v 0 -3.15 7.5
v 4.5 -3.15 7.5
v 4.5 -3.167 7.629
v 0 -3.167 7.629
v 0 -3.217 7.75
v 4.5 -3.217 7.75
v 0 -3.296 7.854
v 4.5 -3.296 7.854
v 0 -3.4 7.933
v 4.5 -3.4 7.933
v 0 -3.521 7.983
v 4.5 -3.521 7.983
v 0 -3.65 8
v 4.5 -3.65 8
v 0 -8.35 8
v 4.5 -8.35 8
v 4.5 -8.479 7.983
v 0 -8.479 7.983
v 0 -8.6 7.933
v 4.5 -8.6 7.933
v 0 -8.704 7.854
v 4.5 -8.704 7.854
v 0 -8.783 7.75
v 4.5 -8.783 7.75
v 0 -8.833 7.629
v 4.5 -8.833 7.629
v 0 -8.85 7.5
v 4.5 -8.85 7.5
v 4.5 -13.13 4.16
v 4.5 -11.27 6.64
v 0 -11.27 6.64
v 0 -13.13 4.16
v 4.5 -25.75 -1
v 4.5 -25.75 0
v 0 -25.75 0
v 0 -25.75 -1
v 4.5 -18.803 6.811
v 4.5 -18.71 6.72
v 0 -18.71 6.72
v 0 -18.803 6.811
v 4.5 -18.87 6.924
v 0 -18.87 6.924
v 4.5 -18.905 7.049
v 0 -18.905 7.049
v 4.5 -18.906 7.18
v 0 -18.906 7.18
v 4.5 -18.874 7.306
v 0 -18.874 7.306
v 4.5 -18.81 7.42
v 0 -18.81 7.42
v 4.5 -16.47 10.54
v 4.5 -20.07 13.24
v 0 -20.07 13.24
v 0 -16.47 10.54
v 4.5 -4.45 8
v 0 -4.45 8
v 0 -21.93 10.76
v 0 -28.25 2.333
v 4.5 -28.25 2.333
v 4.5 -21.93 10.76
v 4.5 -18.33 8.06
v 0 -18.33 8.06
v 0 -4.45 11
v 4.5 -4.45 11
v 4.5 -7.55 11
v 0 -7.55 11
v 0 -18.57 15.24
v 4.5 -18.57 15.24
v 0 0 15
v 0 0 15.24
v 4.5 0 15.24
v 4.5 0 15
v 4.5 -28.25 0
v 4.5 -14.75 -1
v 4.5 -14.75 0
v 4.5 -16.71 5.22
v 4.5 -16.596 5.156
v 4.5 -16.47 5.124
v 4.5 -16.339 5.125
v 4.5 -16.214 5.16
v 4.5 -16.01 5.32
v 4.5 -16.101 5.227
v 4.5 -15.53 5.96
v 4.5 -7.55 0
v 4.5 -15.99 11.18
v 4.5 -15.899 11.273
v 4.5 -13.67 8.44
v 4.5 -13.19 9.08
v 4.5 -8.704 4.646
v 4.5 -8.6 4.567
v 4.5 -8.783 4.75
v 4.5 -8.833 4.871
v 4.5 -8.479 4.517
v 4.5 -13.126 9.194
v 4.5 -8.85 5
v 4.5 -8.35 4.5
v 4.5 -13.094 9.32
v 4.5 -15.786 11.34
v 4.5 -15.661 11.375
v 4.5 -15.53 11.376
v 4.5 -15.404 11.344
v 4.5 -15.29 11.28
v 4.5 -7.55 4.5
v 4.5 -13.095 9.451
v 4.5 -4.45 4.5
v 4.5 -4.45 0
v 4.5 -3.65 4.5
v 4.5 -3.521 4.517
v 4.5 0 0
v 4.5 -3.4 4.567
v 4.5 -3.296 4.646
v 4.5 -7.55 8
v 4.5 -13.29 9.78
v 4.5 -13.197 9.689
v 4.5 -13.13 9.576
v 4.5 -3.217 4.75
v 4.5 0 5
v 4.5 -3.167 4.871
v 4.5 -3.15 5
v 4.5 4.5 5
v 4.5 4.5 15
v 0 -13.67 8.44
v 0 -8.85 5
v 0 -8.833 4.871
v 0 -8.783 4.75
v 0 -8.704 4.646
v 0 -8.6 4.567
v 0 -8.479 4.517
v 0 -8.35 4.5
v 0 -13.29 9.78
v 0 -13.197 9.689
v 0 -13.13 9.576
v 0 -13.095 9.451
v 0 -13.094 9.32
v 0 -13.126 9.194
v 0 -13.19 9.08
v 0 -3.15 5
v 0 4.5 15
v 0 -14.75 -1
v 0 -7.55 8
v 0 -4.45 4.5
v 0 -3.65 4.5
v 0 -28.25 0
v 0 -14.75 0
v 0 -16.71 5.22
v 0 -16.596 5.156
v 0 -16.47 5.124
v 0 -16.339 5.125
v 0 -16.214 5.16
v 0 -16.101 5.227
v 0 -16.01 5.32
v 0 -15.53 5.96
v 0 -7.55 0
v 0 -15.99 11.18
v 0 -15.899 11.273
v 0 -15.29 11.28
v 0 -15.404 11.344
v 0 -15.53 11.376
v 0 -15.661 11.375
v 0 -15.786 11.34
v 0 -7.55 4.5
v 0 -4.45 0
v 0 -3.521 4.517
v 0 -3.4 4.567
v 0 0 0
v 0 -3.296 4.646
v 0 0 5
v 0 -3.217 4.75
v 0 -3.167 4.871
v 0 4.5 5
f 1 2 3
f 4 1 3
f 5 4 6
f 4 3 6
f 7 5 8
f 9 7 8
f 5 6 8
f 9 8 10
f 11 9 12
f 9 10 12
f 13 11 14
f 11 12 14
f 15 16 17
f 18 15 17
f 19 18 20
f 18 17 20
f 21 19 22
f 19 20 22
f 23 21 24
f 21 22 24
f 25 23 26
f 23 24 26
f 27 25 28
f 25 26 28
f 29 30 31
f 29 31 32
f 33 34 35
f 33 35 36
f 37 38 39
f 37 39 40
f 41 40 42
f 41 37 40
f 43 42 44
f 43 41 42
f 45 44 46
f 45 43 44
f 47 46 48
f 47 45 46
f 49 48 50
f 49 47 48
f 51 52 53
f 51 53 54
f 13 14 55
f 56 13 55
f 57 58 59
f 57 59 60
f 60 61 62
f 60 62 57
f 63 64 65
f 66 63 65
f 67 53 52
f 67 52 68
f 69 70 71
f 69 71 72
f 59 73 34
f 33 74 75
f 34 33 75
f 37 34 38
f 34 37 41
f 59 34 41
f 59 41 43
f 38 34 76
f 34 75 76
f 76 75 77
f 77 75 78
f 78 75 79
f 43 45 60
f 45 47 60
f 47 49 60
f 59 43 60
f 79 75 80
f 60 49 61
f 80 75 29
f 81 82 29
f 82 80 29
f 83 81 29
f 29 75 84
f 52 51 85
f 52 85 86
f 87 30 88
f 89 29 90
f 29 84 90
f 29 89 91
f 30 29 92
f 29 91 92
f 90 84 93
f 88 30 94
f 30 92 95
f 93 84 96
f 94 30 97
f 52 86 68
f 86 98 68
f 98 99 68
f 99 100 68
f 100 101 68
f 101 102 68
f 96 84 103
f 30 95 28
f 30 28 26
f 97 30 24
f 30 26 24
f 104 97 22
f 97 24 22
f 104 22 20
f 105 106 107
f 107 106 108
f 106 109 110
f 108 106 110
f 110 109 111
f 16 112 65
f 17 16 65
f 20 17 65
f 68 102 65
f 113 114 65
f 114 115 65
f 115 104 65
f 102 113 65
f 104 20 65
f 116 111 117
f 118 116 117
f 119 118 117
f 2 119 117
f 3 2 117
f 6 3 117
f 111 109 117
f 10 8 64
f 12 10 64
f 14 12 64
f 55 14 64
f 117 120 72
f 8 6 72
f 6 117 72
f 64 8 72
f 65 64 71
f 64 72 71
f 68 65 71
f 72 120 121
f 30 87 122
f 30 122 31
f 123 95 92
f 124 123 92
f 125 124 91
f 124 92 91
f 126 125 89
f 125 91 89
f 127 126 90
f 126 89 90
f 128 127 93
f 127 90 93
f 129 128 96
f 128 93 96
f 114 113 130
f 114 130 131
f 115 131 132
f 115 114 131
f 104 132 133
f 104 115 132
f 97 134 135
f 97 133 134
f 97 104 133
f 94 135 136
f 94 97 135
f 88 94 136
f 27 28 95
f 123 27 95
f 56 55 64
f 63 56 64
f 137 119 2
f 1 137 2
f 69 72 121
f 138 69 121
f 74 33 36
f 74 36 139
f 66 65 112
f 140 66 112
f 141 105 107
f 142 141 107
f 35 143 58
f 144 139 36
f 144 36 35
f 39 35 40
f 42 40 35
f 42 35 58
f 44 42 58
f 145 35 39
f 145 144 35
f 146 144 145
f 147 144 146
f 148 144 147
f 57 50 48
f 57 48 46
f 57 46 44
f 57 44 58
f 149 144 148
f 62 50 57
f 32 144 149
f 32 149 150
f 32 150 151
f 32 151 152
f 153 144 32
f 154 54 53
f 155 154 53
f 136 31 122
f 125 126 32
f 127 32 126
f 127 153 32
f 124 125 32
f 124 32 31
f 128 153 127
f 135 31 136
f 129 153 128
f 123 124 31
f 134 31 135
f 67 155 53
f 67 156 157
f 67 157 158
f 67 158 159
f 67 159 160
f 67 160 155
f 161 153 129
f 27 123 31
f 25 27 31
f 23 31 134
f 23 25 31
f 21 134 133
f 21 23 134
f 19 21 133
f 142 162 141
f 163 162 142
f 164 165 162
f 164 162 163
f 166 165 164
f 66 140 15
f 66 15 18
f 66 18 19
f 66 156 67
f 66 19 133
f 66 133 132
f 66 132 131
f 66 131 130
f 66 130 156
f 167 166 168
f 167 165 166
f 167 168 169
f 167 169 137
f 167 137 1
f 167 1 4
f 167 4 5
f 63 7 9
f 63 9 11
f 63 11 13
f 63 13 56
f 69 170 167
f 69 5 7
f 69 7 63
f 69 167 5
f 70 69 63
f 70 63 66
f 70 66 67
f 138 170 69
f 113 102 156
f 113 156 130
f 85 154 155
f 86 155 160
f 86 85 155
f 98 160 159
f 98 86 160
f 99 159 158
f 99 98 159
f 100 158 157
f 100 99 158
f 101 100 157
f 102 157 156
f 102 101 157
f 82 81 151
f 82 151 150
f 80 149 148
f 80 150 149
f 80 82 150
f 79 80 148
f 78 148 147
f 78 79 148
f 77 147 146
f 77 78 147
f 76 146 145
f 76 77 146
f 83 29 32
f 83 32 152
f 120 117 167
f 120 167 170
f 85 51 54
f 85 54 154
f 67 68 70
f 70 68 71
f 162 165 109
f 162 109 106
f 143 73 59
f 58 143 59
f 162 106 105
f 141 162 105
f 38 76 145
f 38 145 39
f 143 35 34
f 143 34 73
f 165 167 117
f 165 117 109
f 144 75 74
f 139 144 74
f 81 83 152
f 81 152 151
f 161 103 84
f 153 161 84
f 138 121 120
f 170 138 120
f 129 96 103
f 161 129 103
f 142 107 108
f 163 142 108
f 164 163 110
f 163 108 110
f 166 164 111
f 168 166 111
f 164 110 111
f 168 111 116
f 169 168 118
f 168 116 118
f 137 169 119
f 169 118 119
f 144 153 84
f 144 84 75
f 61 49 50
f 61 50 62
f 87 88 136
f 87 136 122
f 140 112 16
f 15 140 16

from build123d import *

# Parameters (mm, degrees)
BOSS_EXTRUDE1_DEPTH = 4.5
SKETCH2_W           = 1
SKETCH2_H           = 11
BOSS_EXTRUDE2_DEPTH = 4.5
CUT_EXTRUDE1_DEPTH  = 51.20209159
CUT_EXTRUDE2_DEPTH  = 51.20209159
CUT_EXTRUDE3_DEPTH  = 51.20209159
SKETCH8_W           = 10
SKETCH8_H           = 4.5
BOSS_EXTRUDE3_DEPTH = 4.5
CUT_EXTRUDE4_DEPTH  = 34.948602328


with BuildPart() as part:
    # Sketch1 → Boss-Extrude1 (new body)
    with BuildSketch(Plane(origin=(0, 0, 0), x_dir=(0, 0, -1), z_dir=(1, 0, 0))):
        Polygon((0, 0), (0, -30), (-40, 0), align=None)
    extrude(amount=BOSS_EXTRUDE1_DEPTH)

    # Sketch2 → Boss-Extrude2 (add, through all)
    with BuildSketch(Plane(origin=(4.5, 0, 0), x_dir=(0, 0, -1), z_dir=(1, 0, 0))):
        with Locations((0.5, -20.25)):
            Rectangle(SKETCH2_W, SKETCH2_H)
    extrude(amount=-BOSS_EXTRUDE2_DEPTH)

    # Sketch3 → Cut-Extrude1 (cut, through all)
    with BuildSketch(Plane(origin=(4.5, 0, 0), x_dir=(0, 0, -1), z_dir=(1, 0, 0))):
        with BuildLine():
            Line((0, -4.45), (-4.5, -4.45))
            Line((-4.5, -4.45), (-4.5, -3.65))
            ThreePointArc((-4.5, -3.65), (-4.646446609, -3.296446609), (-5, -3.15))
            Line((-5, -3.15), (-7.5, -3.15))
            ThreePointArc((-7.5, -3.15), (-7.853553391, -3.296446609), (-8, -3.65))
            Line((-8, -3.65), (-8, -4.45))
            Line((-8, -4.45), (-11, -4.45))
            Line((-11, -4.45), (-11, -7.55))
            Line((-11, -7.55), (-8, -7.55))
            Line((-8, -7.55), (-8, -8.35))
            ThreePointArc((-8, -8.35), (-7.853553391, -8.703553391), (-7.5, -8.85))
            Line((-7.5, -8.85), (-5, -8.85))
            ThreePointArc((-5, -8.85), (-4.646446609, -8.703553391), (-4.5, -8.35))
            Line((-4.5, -8.35), (-4.5, -7.55))
            Line((-4.5, -7.55), (0, -7.55))
            Line((0, -7.55), (0, -4.45))
        make_face()
    extrude(amount=-CUT_EXTRUDE1_DEPTH, mode=Mode.SUBTRACT)

    # Sketch4 → Cut-Extrude2 (cut, through all)
    with BuildSketch(Plane(origin=(4.5, 0, 0), x_dir=(0, 0, -1), z_dir=(1, 0, 0))):
        with BuildLine():
            Line((-10.76, -21.93), (-13.24, -20.07))
            Line((-13.24, -20.07), (-10.54, -16.47))
            Line((-10.54, -16.47), (-11.18, -15.99))
            ThreePointArc((-11.18, -15.99), (-11.374974747, -15.660710678), (-11.28, -15.29))
            Line((-11.28, -15.29), (-9.78, -13.29))
            ThreePointArc((-9.78, -13.29), (-9.450710678, -13.095025253), (-9.08, -13.19))
            Line((-9.08, -13.19), (-8.44, -13.67))
            Line((-8.44, -13.67), (-6.64, -11.27))
            Line((-6.64, -11.27), (-4.16, -13.13))
            Line((-4.16, -13.13), (-5.96, -15.53))
            Line((-5.96, -15.53), (-5.32, -16.01))
            ThreePointArc((-5.32, -16.01), (-5.125025253, -16.339289322), (-5.22, -16.71))
            Line((-5.22, -16.71), (-6.72, -18.71))
            ThreePointArc((-6.72, -18.71), (-7.049289322, -18.904974747), (-7.42, -18.81))
            Line((-7.42, -18.81), (-8.06, -18.33))
            Line((-8.06, -18.33), (-10.76, -21.93))
        make_face()
    extrude(amount=-CUT_EXTRUDE2_DEPTH, mode=Mode.SUBTRACT)

    # Sketch5 → Cut-Extrude3 (cut, through all)
    with BuildSketch(Plane(origin=(4.5, 0, 0), x_dir=(0, 0, -1), z_dir=(1, 0, 0))):
        Polygon((-15.24, -18.57), (-15.24, 0), (-40, 0), align=None)
    extrude(amount=-CUT_EXTRUDE3_DEPTH, mode=Mode.SUBTRACT)

    # Sketch8 → Boss-Extrude3 (add, through all)
    with BuildSketch(Plane(origin=(4.5, 0, 0), x_dir=(0, 0, -1), z_dir=(1, 0, 0))):
        with Locations((-10, 2.25)):
            Rectangle(SKETCH8_W, SKETCH8_H)
    extrude(amount=-BOSS_EXTRUDE3_DEPTH)

    # Sketch10 → Cut-Extrude4 (cut, through all)
    with BuildSketch(Plane(origin=(4.5, 0, 0), x_dir=(0, 0, -1), z_dir=(1, 0, 0))):
        Polygon((0, -28.25), (-2.333333333, -28.25), (0, -30), align=None)
    extrude(amount=-CUT_EXTRUDE4_DEPTH, mode=Mode.SUBTRACT)


solid = part.part
